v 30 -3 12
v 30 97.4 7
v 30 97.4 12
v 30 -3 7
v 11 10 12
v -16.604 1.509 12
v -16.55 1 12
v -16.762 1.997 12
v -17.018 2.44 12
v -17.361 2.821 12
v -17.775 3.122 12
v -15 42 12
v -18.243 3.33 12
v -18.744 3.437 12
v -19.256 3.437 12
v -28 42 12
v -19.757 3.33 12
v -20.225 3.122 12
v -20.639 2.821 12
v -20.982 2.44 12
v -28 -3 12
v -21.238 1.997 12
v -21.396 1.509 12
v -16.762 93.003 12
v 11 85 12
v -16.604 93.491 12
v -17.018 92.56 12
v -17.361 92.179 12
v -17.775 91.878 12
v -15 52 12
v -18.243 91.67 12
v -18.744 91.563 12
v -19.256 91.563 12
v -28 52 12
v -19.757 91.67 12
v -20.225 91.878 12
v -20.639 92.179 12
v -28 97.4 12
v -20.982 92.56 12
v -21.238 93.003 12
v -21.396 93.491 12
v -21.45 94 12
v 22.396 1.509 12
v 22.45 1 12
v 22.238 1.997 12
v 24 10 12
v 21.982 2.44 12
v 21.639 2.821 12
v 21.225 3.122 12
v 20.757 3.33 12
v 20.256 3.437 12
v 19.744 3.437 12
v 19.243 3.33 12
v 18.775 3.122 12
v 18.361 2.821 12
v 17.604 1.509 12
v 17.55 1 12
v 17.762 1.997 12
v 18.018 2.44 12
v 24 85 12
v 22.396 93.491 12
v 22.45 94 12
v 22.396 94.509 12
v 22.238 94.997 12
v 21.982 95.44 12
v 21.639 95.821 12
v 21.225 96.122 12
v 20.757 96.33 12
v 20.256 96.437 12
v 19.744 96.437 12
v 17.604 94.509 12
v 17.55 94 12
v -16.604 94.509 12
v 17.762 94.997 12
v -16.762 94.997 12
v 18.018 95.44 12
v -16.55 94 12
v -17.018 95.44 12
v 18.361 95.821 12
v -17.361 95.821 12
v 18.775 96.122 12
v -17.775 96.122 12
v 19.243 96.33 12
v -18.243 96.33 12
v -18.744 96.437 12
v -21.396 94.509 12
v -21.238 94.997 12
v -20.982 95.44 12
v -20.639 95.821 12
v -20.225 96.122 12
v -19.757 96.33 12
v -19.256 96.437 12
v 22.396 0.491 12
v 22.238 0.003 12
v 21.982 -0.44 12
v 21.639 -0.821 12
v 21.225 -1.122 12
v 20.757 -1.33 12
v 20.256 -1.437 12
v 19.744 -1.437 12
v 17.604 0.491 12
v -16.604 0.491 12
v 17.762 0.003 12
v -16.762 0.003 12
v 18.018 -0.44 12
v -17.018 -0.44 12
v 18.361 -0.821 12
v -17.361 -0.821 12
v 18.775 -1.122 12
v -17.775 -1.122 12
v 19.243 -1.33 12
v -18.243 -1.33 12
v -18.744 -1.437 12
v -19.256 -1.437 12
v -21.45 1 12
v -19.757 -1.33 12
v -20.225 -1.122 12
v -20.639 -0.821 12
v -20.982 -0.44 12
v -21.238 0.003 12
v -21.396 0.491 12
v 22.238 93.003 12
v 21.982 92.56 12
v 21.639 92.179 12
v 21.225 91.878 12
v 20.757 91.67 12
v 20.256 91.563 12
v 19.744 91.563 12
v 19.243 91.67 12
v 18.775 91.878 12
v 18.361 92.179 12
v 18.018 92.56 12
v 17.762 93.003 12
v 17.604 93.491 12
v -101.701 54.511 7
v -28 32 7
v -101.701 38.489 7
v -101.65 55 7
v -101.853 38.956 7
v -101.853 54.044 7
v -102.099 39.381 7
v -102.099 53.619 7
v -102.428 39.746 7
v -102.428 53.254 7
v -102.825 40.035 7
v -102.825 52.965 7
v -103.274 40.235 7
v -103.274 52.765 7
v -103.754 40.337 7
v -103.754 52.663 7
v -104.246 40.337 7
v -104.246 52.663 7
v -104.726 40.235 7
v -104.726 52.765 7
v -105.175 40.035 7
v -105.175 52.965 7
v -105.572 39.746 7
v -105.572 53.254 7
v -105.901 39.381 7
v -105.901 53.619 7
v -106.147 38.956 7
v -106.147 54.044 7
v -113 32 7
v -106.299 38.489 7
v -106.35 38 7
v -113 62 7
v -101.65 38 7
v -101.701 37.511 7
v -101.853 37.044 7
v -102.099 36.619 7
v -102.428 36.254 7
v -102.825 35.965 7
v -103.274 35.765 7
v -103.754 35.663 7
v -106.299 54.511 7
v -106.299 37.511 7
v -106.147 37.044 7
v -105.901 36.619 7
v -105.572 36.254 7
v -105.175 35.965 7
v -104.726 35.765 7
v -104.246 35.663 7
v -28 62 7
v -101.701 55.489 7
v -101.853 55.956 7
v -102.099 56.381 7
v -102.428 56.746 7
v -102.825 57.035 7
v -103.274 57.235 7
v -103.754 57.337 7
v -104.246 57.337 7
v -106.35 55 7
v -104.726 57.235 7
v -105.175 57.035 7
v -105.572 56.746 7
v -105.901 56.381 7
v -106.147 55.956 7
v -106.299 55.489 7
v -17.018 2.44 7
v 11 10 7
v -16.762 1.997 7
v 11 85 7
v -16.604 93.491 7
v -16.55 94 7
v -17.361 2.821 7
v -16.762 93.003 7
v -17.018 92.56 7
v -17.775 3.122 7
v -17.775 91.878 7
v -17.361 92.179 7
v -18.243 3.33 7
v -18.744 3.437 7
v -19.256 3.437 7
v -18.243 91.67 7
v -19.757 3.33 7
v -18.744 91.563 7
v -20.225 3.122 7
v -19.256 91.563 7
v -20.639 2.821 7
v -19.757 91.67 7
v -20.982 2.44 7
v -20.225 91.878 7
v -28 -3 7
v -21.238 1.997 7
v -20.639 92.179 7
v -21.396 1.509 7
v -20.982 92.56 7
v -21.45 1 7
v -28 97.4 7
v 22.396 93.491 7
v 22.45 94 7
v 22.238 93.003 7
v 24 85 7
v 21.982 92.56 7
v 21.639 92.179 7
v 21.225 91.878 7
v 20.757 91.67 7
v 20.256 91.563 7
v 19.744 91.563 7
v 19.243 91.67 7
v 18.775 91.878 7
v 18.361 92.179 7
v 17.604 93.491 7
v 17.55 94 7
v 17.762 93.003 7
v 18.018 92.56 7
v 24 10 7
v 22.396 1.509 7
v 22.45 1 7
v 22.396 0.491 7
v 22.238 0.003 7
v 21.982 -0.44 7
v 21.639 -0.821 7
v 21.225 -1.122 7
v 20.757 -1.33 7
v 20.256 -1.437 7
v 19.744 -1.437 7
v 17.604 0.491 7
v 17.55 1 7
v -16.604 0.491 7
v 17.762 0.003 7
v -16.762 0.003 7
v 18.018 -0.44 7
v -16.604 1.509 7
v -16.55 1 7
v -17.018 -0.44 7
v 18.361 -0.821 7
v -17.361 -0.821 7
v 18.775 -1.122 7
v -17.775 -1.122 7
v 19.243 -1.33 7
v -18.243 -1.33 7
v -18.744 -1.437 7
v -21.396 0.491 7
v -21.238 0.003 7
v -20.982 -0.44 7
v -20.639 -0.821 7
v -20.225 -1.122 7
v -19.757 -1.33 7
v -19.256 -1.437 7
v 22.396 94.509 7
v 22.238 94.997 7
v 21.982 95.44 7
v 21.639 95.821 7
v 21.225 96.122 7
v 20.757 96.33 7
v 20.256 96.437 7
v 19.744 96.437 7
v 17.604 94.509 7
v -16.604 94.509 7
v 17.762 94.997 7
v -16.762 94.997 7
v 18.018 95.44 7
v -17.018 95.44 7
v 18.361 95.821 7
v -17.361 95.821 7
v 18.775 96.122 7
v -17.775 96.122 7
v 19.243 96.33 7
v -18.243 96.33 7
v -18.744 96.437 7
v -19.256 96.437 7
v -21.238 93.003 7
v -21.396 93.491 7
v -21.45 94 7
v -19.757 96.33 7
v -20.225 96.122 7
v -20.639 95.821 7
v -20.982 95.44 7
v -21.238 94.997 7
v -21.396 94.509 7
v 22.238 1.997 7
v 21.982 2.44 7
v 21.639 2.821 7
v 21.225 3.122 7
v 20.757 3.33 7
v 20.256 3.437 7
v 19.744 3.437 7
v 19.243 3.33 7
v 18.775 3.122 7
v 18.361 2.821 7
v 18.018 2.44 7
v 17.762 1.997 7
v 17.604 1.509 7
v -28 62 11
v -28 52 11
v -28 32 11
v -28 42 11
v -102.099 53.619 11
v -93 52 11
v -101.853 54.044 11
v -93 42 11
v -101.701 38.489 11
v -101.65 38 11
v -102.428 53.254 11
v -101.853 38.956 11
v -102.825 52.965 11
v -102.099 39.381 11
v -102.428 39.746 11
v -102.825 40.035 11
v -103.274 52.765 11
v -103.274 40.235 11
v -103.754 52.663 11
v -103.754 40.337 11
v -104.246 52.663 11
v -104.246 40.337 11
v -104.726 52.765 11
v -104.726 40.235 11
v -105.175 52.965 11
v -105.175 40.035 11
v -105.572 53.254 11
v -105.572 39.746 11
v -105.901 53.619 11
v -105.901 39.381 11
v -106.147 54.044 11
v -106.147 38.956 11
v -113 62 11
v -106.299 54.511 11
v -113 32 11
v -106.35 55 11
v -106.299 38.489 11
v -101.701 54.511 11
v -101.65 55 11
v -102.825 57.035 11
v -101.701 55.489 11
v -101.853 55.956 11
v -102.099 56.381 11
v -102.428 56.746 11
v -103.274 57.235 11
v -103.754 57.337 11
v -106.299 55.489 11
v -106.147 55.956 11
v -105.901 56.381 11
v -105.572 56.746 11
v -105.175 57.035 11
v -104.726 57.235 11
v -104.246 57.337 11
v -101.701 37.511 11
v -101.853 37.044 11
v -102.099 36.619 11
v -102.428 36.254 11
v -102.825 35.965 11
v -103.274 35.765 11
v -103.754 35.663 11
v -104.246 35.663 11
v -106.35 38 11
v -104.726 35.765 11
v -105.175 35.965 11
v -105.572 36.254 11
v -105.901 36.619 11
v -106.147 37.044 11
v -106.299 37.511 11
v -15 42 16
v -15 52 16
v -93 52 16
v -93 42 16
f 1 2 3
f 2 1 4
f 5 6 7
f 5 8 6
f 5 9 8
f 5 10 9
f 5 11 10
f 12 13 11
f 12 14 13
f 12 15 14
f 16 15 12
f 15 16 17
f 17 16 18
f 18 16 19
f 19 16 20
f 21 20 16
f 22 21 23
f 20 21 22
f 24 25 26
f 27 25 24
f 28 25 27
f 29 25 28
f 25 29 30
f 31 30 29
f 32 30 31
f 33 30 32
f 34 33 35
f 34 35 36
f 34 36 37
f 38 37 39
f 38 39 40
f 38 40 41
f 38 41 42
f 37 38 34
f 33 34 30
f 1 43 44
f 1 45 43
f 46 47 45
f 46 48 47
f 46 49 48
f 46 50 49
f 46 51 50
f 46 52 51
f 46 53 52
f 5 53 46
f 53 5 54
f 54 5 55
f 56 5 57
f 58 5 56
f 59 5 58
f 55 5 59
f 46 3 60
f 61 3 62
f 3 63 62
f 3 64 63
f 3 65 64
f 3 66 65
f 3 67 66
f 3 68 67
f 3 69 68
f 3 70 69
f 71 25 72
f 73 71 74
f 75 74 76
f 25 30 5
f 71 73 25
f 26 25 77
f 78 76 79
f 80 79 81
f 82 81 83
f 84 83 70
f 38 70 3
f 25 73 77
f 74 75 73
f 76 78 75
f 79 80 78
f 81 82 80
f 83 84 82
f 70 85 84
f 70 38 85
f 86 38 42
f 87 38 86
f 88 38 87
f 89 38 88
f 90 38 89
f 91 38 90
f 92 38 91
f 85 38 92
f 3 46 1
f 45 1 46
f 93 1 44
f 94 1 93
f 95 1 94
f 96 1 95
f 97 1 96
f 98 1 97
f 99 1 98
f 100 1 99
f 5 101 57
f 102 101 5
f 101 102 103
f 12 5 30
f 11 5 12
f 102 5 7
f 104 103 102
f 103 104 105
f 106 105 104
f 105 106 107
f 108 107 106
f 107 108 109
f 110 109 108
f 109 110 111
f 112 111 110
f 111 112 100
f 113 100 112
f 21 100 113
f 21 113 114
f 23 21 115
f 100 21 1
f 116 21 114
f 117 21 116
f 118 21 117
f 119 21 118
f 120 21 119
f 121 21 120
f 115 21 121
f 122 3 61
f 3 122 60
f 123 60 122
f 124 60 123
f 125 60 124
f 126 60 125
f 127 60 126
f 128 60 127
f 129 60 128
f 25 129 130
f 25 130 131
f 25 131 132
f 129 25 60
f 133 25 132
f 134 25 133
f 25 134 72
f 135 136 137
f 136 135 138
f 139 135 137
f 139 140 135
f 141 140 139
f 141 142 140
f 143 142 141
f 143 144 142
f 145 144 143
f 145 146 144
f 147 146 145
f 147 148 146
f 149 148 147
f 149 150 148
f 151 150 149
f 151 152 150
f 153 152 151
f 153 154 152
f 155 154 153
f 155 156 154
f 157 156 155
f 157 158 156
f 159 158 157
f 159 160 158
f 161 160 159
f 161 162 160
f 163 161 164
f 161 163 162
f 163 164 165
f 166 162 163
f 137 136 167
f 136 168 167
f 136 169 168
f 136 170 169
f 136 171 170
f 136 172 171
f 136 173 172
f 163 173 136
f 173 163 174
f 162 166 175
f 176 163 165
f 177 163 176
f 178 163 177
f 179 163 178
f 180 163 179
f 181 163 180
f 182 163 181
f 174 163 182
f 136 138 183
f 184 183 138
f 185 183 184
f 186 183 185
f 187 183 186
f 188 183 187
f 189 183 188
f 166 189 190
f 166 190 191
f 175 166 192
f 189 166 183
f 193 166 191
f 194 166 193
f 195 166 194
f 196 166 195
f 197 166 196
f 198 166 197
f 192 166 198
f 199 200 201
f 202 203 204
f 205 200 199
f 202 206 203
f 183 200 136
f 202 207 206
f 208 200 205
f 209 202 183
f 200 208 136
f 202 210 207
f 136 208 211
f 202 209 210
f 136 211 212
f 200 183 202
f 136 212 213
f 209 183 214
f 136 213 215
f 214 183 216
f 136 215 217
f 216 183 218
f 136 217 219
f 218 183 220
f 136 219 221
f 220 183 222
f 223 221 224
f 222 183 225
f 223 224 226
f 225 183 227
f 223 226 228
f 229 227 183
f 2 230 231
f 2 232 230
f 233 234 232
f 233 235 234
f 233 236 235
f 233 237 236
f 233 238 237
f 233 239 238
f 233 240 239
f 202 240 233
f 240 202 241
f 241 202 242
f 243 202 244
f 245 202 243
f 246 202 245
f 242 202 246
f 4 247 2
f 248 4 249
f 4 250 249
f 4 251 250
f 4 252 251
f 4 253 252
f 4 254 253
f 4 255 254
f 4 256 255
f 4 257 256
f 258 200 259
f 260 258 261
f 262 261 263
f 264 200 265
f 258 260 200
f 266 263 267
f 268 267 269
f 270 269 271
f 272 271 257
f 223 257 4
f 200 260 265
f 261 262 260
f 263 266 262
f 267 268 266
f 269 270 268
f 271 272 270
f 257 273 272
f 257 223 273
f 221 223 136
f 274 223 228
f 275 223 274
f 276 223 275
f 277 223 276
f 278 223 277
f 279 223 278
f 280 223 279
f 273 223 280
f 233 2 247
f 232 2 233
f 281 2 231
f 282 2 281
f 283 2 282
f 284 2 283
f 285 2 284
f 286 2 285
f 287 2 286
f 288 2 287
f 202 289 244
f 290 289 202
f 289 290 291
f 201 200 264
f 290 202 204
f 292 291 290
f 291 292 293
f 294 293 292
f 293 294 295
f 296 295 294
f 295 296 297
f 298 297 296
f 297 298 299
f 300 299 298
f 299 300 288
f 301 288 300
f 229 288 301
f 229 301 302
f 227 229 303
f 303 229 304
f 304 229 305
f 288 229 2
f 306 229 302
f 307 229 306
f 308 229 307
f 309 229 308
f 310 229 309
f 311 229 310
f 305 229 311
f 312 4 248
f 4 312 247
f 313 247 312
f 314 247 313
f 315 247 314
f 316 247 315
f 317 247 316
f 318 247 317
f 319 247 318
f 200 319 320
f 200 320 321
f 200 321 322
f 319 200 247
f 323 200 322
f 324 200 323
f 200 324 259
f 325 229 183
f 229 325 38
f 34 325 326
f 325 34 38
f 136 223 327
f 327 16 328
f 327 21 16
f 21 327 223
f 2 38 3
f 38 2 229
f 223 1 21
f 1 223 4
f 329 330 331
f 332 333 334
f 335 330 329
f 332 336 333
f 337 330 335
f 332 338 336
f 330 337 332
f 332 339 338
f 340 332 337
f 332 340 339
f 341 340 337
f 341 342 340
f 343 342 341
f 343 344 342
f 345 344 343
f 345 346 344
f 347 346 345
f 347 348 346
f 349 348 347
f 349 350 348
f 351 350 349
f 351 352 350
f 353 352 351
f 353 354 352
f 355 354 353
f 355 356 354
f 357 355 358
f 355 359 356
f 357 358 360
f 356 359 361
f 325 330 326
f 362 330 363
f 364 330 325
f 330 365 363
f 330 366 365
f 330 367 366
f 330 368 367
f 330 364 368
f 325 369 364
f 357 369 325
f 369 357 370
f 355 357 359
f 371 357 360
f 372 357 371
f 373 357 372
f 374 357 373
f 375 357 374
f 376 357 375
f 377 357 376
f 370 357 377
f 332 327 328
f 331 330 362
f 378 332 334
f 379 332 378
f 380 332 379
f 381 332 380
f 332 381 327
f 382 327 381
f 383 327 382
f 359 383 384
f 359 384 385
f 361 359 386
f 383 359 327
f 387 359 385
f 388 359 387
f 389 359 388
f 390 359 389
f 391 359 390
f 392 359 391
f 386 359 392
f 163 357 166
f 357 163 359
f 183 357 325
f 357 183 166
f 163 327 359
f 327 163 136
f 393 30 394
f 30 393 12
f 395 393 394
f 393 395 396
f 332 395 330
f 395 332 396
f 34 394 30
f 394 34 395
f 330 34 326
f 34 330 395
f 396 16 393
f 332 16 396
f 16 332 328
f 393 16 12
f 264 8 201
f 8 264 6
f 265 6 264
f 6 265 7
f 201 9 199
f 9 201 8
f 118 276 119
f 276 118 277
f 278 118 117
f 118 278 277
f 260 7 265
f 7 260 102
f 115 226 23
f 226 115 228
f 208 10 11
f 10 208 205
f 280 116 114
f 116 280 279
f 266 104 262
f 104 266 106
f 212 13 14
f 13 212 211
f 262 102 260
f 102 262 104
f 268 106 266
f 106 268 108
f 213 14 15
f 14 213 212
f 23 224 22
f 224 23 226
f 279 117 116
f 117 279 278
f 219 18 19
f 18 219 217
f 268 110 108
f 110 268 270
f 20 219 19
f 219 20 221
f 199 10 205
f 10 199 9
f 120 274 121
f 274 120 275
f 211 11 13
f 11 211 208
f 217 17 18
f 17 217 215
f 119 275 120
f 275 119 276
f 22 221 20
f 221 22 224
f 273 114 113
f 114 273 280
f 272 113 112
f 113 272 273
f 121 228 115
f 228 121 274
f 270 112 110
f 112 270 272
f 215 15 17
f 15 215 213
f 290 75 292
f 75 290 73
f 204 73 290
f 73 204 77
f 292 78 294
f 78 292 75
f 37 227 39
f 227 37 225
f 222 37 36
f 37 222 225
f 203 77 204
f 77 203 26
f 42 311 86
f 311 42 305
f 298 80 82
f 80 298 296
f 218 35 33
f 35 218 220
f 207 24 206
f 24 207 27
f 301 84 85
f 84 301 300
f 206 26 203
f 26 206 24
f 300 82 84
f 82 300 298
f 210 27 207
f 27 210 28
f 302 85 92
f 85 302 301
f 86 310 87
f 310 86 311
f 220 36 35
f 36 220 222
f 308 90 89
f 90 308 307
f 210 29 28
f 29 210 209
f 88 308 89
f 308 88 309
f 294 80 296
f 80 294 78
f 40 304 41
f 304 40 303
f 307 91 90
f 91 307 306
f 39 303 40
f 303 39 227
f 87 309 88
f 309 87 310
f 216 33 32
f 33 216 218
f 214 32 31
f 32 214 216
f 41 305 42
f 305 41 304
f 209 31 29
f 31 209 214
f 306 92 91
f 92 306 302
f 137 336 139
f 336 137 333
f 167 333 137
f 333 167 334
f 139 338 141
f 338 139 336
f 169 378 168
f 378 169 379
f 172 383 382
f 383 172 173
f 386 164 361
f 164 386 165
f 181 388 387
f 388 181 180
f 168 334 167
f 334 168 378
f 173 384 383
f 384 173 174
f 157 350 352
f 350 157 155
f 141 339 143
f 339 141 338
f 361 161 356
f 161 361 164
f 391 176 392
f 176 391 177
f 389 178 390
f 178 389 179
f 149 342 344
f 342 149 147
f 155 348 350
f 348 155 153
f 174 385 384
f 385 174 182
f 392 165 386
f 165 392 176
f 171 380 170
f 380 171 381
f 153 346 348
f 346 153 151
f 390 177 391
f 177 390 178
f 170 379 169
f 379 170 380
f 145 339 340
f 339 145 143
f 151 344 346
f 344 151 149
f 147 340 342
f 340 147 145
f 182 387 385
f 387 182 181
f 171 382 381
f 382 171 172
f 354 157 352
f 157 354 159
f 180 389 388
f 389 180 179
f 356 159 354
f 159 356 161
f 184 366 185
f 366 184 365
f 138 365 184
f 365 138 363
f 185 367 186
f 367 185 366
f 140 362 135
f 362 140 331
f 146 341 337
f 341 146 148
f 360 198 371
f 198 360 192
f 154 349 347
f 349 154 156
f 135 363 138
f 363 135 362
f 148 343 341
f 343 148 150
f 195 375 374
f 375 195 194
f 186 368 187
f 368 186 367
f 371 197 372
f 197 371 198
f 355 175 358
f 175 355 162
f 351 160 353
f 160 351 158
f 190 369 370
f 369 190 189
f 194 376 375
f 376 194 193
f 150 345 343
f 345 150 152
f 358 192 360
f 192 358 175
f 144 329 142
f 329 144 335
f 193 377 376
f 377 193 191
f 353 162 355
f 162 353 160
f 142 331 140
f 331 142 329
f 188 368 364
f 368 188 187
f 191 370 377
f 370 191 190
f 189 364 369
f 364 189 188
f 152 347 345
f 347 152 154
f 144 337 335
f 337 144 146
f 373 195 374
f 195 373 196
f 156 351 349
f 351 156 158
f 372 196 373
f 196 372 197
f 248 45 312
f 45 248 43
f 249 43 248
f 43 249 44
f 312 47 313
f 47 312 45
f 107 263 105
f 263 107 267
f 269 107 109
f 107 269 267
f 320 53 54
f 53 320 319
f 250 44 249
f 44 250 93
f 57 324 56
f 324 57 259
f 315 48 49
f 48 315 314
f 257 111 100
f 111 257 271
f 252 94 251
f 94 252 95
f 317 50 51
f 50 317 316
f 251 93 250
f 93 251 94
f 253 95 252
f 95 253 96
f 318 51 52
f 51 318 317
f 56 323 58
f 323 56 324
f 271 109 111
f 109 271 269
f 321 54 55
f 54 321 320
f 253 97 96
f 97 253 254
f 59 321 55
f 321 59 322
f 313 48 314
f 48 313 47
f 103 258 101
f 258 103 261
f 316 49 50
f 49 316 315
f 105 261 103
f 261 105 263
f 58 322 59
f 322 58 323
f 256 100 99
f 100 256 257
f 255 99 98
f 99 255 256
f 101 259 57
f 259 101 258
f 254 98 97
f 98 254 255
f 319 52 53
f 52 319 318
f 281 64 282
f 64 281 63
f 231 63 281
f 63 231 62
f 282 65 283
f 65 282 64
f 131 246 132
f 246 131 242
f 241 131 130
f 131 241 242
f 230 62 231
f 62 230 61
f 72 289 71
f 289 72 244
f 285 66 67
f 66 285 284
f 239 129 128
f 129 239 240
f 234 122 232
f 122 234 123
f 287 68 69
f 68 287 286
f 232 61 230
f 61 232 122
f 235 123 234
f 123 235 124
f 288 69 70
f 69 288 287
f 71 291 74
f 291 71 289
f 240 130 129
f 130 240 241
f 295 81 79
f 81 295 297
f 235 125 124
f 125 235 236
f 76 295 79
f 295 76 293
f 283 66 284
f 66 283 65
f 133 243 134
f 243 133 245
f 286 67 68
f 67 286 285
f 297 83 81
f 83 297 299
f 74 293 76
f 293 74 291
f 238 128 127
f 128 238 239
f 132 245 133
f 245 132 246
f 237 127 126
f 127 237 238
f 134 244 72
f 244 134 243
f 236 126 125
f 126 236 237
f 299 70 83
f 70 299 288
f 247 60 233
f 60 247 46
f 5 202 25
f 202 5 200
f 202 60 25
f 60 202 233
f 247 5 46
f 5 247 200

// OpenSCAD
imagingblock_lid();
//imagingblock_lid
module imagingblock_lid(){
 translate([0,0,-30])difference(){
 color("lime")union(){
 translate([-3-20-5,-3,-3+40])cube([40+8+10,((77*1.2)+8),5]);
 translate([-3-20-5-50-35,-3+35,-3+40])cube([40+8+10+50+35,30,4]);
 translate([-3-20-5-50-35+20,-3+35+10,-3+40])cube([40+8+10+50+35-65,10,4+5]);
 }
 translate([11-80-35,38,23])cylinder(r=4.7/2,h=50,$fn=30);
 translate([11-80-35,37+18,23])cylinder(r=4.7/2,h=50,$fn=30);

 translate([20-22-60,1+7-2,23+8])rotate([0,90,0])cylinder(r=2.9/2,h=250,$fn=30);
 translate([20-22-60,1+7+80,23+8])rotate([0,90,0])cylinder(r=2.9/2,h=250,$fn=30);
 translate([0,0,-27]){
 translate([20-22-60,1+7-2,23+8])rotate([0,90,0])cylinder(r=2.9/2,h=250,$fn=30);
 translate([20-22-60,1+7+80,23+8])rotate([0,90,0])cylinder(r=2.9/2,h=250,$fn=30);
 }
 translate([20,1,23])cylinder(r=4.9/2,h=50,$fn=30);
 translate([20,1+93,23])cylinder(r=4.9/2,h=50,$fn=30);
 translate([-39,0,0]){
 translate([20,1,23])cylinder(r=4.9/2,h=50,$fn=30);
 translate([20,1+93,23])cylinder(r=4.9/2,h=50,$fn=30);
 }
 translate([11+7-5-2,16-4-2,38-3])cube([13,72+3,30]);
 translate([-51,24,13])rotate([0,90,0])cylinder(r=3.8/2,h=40,$fn=30);
 translate([-51,24+45/2+0.4,22])rotate([0,90,0])cylinder(r=13.5/2,h=40,$fn=30);
 translate([-51,24+45,13])rotate([0,90,0])cylinder(r=3.8/2,h=40,$fn=30);
 }
}
